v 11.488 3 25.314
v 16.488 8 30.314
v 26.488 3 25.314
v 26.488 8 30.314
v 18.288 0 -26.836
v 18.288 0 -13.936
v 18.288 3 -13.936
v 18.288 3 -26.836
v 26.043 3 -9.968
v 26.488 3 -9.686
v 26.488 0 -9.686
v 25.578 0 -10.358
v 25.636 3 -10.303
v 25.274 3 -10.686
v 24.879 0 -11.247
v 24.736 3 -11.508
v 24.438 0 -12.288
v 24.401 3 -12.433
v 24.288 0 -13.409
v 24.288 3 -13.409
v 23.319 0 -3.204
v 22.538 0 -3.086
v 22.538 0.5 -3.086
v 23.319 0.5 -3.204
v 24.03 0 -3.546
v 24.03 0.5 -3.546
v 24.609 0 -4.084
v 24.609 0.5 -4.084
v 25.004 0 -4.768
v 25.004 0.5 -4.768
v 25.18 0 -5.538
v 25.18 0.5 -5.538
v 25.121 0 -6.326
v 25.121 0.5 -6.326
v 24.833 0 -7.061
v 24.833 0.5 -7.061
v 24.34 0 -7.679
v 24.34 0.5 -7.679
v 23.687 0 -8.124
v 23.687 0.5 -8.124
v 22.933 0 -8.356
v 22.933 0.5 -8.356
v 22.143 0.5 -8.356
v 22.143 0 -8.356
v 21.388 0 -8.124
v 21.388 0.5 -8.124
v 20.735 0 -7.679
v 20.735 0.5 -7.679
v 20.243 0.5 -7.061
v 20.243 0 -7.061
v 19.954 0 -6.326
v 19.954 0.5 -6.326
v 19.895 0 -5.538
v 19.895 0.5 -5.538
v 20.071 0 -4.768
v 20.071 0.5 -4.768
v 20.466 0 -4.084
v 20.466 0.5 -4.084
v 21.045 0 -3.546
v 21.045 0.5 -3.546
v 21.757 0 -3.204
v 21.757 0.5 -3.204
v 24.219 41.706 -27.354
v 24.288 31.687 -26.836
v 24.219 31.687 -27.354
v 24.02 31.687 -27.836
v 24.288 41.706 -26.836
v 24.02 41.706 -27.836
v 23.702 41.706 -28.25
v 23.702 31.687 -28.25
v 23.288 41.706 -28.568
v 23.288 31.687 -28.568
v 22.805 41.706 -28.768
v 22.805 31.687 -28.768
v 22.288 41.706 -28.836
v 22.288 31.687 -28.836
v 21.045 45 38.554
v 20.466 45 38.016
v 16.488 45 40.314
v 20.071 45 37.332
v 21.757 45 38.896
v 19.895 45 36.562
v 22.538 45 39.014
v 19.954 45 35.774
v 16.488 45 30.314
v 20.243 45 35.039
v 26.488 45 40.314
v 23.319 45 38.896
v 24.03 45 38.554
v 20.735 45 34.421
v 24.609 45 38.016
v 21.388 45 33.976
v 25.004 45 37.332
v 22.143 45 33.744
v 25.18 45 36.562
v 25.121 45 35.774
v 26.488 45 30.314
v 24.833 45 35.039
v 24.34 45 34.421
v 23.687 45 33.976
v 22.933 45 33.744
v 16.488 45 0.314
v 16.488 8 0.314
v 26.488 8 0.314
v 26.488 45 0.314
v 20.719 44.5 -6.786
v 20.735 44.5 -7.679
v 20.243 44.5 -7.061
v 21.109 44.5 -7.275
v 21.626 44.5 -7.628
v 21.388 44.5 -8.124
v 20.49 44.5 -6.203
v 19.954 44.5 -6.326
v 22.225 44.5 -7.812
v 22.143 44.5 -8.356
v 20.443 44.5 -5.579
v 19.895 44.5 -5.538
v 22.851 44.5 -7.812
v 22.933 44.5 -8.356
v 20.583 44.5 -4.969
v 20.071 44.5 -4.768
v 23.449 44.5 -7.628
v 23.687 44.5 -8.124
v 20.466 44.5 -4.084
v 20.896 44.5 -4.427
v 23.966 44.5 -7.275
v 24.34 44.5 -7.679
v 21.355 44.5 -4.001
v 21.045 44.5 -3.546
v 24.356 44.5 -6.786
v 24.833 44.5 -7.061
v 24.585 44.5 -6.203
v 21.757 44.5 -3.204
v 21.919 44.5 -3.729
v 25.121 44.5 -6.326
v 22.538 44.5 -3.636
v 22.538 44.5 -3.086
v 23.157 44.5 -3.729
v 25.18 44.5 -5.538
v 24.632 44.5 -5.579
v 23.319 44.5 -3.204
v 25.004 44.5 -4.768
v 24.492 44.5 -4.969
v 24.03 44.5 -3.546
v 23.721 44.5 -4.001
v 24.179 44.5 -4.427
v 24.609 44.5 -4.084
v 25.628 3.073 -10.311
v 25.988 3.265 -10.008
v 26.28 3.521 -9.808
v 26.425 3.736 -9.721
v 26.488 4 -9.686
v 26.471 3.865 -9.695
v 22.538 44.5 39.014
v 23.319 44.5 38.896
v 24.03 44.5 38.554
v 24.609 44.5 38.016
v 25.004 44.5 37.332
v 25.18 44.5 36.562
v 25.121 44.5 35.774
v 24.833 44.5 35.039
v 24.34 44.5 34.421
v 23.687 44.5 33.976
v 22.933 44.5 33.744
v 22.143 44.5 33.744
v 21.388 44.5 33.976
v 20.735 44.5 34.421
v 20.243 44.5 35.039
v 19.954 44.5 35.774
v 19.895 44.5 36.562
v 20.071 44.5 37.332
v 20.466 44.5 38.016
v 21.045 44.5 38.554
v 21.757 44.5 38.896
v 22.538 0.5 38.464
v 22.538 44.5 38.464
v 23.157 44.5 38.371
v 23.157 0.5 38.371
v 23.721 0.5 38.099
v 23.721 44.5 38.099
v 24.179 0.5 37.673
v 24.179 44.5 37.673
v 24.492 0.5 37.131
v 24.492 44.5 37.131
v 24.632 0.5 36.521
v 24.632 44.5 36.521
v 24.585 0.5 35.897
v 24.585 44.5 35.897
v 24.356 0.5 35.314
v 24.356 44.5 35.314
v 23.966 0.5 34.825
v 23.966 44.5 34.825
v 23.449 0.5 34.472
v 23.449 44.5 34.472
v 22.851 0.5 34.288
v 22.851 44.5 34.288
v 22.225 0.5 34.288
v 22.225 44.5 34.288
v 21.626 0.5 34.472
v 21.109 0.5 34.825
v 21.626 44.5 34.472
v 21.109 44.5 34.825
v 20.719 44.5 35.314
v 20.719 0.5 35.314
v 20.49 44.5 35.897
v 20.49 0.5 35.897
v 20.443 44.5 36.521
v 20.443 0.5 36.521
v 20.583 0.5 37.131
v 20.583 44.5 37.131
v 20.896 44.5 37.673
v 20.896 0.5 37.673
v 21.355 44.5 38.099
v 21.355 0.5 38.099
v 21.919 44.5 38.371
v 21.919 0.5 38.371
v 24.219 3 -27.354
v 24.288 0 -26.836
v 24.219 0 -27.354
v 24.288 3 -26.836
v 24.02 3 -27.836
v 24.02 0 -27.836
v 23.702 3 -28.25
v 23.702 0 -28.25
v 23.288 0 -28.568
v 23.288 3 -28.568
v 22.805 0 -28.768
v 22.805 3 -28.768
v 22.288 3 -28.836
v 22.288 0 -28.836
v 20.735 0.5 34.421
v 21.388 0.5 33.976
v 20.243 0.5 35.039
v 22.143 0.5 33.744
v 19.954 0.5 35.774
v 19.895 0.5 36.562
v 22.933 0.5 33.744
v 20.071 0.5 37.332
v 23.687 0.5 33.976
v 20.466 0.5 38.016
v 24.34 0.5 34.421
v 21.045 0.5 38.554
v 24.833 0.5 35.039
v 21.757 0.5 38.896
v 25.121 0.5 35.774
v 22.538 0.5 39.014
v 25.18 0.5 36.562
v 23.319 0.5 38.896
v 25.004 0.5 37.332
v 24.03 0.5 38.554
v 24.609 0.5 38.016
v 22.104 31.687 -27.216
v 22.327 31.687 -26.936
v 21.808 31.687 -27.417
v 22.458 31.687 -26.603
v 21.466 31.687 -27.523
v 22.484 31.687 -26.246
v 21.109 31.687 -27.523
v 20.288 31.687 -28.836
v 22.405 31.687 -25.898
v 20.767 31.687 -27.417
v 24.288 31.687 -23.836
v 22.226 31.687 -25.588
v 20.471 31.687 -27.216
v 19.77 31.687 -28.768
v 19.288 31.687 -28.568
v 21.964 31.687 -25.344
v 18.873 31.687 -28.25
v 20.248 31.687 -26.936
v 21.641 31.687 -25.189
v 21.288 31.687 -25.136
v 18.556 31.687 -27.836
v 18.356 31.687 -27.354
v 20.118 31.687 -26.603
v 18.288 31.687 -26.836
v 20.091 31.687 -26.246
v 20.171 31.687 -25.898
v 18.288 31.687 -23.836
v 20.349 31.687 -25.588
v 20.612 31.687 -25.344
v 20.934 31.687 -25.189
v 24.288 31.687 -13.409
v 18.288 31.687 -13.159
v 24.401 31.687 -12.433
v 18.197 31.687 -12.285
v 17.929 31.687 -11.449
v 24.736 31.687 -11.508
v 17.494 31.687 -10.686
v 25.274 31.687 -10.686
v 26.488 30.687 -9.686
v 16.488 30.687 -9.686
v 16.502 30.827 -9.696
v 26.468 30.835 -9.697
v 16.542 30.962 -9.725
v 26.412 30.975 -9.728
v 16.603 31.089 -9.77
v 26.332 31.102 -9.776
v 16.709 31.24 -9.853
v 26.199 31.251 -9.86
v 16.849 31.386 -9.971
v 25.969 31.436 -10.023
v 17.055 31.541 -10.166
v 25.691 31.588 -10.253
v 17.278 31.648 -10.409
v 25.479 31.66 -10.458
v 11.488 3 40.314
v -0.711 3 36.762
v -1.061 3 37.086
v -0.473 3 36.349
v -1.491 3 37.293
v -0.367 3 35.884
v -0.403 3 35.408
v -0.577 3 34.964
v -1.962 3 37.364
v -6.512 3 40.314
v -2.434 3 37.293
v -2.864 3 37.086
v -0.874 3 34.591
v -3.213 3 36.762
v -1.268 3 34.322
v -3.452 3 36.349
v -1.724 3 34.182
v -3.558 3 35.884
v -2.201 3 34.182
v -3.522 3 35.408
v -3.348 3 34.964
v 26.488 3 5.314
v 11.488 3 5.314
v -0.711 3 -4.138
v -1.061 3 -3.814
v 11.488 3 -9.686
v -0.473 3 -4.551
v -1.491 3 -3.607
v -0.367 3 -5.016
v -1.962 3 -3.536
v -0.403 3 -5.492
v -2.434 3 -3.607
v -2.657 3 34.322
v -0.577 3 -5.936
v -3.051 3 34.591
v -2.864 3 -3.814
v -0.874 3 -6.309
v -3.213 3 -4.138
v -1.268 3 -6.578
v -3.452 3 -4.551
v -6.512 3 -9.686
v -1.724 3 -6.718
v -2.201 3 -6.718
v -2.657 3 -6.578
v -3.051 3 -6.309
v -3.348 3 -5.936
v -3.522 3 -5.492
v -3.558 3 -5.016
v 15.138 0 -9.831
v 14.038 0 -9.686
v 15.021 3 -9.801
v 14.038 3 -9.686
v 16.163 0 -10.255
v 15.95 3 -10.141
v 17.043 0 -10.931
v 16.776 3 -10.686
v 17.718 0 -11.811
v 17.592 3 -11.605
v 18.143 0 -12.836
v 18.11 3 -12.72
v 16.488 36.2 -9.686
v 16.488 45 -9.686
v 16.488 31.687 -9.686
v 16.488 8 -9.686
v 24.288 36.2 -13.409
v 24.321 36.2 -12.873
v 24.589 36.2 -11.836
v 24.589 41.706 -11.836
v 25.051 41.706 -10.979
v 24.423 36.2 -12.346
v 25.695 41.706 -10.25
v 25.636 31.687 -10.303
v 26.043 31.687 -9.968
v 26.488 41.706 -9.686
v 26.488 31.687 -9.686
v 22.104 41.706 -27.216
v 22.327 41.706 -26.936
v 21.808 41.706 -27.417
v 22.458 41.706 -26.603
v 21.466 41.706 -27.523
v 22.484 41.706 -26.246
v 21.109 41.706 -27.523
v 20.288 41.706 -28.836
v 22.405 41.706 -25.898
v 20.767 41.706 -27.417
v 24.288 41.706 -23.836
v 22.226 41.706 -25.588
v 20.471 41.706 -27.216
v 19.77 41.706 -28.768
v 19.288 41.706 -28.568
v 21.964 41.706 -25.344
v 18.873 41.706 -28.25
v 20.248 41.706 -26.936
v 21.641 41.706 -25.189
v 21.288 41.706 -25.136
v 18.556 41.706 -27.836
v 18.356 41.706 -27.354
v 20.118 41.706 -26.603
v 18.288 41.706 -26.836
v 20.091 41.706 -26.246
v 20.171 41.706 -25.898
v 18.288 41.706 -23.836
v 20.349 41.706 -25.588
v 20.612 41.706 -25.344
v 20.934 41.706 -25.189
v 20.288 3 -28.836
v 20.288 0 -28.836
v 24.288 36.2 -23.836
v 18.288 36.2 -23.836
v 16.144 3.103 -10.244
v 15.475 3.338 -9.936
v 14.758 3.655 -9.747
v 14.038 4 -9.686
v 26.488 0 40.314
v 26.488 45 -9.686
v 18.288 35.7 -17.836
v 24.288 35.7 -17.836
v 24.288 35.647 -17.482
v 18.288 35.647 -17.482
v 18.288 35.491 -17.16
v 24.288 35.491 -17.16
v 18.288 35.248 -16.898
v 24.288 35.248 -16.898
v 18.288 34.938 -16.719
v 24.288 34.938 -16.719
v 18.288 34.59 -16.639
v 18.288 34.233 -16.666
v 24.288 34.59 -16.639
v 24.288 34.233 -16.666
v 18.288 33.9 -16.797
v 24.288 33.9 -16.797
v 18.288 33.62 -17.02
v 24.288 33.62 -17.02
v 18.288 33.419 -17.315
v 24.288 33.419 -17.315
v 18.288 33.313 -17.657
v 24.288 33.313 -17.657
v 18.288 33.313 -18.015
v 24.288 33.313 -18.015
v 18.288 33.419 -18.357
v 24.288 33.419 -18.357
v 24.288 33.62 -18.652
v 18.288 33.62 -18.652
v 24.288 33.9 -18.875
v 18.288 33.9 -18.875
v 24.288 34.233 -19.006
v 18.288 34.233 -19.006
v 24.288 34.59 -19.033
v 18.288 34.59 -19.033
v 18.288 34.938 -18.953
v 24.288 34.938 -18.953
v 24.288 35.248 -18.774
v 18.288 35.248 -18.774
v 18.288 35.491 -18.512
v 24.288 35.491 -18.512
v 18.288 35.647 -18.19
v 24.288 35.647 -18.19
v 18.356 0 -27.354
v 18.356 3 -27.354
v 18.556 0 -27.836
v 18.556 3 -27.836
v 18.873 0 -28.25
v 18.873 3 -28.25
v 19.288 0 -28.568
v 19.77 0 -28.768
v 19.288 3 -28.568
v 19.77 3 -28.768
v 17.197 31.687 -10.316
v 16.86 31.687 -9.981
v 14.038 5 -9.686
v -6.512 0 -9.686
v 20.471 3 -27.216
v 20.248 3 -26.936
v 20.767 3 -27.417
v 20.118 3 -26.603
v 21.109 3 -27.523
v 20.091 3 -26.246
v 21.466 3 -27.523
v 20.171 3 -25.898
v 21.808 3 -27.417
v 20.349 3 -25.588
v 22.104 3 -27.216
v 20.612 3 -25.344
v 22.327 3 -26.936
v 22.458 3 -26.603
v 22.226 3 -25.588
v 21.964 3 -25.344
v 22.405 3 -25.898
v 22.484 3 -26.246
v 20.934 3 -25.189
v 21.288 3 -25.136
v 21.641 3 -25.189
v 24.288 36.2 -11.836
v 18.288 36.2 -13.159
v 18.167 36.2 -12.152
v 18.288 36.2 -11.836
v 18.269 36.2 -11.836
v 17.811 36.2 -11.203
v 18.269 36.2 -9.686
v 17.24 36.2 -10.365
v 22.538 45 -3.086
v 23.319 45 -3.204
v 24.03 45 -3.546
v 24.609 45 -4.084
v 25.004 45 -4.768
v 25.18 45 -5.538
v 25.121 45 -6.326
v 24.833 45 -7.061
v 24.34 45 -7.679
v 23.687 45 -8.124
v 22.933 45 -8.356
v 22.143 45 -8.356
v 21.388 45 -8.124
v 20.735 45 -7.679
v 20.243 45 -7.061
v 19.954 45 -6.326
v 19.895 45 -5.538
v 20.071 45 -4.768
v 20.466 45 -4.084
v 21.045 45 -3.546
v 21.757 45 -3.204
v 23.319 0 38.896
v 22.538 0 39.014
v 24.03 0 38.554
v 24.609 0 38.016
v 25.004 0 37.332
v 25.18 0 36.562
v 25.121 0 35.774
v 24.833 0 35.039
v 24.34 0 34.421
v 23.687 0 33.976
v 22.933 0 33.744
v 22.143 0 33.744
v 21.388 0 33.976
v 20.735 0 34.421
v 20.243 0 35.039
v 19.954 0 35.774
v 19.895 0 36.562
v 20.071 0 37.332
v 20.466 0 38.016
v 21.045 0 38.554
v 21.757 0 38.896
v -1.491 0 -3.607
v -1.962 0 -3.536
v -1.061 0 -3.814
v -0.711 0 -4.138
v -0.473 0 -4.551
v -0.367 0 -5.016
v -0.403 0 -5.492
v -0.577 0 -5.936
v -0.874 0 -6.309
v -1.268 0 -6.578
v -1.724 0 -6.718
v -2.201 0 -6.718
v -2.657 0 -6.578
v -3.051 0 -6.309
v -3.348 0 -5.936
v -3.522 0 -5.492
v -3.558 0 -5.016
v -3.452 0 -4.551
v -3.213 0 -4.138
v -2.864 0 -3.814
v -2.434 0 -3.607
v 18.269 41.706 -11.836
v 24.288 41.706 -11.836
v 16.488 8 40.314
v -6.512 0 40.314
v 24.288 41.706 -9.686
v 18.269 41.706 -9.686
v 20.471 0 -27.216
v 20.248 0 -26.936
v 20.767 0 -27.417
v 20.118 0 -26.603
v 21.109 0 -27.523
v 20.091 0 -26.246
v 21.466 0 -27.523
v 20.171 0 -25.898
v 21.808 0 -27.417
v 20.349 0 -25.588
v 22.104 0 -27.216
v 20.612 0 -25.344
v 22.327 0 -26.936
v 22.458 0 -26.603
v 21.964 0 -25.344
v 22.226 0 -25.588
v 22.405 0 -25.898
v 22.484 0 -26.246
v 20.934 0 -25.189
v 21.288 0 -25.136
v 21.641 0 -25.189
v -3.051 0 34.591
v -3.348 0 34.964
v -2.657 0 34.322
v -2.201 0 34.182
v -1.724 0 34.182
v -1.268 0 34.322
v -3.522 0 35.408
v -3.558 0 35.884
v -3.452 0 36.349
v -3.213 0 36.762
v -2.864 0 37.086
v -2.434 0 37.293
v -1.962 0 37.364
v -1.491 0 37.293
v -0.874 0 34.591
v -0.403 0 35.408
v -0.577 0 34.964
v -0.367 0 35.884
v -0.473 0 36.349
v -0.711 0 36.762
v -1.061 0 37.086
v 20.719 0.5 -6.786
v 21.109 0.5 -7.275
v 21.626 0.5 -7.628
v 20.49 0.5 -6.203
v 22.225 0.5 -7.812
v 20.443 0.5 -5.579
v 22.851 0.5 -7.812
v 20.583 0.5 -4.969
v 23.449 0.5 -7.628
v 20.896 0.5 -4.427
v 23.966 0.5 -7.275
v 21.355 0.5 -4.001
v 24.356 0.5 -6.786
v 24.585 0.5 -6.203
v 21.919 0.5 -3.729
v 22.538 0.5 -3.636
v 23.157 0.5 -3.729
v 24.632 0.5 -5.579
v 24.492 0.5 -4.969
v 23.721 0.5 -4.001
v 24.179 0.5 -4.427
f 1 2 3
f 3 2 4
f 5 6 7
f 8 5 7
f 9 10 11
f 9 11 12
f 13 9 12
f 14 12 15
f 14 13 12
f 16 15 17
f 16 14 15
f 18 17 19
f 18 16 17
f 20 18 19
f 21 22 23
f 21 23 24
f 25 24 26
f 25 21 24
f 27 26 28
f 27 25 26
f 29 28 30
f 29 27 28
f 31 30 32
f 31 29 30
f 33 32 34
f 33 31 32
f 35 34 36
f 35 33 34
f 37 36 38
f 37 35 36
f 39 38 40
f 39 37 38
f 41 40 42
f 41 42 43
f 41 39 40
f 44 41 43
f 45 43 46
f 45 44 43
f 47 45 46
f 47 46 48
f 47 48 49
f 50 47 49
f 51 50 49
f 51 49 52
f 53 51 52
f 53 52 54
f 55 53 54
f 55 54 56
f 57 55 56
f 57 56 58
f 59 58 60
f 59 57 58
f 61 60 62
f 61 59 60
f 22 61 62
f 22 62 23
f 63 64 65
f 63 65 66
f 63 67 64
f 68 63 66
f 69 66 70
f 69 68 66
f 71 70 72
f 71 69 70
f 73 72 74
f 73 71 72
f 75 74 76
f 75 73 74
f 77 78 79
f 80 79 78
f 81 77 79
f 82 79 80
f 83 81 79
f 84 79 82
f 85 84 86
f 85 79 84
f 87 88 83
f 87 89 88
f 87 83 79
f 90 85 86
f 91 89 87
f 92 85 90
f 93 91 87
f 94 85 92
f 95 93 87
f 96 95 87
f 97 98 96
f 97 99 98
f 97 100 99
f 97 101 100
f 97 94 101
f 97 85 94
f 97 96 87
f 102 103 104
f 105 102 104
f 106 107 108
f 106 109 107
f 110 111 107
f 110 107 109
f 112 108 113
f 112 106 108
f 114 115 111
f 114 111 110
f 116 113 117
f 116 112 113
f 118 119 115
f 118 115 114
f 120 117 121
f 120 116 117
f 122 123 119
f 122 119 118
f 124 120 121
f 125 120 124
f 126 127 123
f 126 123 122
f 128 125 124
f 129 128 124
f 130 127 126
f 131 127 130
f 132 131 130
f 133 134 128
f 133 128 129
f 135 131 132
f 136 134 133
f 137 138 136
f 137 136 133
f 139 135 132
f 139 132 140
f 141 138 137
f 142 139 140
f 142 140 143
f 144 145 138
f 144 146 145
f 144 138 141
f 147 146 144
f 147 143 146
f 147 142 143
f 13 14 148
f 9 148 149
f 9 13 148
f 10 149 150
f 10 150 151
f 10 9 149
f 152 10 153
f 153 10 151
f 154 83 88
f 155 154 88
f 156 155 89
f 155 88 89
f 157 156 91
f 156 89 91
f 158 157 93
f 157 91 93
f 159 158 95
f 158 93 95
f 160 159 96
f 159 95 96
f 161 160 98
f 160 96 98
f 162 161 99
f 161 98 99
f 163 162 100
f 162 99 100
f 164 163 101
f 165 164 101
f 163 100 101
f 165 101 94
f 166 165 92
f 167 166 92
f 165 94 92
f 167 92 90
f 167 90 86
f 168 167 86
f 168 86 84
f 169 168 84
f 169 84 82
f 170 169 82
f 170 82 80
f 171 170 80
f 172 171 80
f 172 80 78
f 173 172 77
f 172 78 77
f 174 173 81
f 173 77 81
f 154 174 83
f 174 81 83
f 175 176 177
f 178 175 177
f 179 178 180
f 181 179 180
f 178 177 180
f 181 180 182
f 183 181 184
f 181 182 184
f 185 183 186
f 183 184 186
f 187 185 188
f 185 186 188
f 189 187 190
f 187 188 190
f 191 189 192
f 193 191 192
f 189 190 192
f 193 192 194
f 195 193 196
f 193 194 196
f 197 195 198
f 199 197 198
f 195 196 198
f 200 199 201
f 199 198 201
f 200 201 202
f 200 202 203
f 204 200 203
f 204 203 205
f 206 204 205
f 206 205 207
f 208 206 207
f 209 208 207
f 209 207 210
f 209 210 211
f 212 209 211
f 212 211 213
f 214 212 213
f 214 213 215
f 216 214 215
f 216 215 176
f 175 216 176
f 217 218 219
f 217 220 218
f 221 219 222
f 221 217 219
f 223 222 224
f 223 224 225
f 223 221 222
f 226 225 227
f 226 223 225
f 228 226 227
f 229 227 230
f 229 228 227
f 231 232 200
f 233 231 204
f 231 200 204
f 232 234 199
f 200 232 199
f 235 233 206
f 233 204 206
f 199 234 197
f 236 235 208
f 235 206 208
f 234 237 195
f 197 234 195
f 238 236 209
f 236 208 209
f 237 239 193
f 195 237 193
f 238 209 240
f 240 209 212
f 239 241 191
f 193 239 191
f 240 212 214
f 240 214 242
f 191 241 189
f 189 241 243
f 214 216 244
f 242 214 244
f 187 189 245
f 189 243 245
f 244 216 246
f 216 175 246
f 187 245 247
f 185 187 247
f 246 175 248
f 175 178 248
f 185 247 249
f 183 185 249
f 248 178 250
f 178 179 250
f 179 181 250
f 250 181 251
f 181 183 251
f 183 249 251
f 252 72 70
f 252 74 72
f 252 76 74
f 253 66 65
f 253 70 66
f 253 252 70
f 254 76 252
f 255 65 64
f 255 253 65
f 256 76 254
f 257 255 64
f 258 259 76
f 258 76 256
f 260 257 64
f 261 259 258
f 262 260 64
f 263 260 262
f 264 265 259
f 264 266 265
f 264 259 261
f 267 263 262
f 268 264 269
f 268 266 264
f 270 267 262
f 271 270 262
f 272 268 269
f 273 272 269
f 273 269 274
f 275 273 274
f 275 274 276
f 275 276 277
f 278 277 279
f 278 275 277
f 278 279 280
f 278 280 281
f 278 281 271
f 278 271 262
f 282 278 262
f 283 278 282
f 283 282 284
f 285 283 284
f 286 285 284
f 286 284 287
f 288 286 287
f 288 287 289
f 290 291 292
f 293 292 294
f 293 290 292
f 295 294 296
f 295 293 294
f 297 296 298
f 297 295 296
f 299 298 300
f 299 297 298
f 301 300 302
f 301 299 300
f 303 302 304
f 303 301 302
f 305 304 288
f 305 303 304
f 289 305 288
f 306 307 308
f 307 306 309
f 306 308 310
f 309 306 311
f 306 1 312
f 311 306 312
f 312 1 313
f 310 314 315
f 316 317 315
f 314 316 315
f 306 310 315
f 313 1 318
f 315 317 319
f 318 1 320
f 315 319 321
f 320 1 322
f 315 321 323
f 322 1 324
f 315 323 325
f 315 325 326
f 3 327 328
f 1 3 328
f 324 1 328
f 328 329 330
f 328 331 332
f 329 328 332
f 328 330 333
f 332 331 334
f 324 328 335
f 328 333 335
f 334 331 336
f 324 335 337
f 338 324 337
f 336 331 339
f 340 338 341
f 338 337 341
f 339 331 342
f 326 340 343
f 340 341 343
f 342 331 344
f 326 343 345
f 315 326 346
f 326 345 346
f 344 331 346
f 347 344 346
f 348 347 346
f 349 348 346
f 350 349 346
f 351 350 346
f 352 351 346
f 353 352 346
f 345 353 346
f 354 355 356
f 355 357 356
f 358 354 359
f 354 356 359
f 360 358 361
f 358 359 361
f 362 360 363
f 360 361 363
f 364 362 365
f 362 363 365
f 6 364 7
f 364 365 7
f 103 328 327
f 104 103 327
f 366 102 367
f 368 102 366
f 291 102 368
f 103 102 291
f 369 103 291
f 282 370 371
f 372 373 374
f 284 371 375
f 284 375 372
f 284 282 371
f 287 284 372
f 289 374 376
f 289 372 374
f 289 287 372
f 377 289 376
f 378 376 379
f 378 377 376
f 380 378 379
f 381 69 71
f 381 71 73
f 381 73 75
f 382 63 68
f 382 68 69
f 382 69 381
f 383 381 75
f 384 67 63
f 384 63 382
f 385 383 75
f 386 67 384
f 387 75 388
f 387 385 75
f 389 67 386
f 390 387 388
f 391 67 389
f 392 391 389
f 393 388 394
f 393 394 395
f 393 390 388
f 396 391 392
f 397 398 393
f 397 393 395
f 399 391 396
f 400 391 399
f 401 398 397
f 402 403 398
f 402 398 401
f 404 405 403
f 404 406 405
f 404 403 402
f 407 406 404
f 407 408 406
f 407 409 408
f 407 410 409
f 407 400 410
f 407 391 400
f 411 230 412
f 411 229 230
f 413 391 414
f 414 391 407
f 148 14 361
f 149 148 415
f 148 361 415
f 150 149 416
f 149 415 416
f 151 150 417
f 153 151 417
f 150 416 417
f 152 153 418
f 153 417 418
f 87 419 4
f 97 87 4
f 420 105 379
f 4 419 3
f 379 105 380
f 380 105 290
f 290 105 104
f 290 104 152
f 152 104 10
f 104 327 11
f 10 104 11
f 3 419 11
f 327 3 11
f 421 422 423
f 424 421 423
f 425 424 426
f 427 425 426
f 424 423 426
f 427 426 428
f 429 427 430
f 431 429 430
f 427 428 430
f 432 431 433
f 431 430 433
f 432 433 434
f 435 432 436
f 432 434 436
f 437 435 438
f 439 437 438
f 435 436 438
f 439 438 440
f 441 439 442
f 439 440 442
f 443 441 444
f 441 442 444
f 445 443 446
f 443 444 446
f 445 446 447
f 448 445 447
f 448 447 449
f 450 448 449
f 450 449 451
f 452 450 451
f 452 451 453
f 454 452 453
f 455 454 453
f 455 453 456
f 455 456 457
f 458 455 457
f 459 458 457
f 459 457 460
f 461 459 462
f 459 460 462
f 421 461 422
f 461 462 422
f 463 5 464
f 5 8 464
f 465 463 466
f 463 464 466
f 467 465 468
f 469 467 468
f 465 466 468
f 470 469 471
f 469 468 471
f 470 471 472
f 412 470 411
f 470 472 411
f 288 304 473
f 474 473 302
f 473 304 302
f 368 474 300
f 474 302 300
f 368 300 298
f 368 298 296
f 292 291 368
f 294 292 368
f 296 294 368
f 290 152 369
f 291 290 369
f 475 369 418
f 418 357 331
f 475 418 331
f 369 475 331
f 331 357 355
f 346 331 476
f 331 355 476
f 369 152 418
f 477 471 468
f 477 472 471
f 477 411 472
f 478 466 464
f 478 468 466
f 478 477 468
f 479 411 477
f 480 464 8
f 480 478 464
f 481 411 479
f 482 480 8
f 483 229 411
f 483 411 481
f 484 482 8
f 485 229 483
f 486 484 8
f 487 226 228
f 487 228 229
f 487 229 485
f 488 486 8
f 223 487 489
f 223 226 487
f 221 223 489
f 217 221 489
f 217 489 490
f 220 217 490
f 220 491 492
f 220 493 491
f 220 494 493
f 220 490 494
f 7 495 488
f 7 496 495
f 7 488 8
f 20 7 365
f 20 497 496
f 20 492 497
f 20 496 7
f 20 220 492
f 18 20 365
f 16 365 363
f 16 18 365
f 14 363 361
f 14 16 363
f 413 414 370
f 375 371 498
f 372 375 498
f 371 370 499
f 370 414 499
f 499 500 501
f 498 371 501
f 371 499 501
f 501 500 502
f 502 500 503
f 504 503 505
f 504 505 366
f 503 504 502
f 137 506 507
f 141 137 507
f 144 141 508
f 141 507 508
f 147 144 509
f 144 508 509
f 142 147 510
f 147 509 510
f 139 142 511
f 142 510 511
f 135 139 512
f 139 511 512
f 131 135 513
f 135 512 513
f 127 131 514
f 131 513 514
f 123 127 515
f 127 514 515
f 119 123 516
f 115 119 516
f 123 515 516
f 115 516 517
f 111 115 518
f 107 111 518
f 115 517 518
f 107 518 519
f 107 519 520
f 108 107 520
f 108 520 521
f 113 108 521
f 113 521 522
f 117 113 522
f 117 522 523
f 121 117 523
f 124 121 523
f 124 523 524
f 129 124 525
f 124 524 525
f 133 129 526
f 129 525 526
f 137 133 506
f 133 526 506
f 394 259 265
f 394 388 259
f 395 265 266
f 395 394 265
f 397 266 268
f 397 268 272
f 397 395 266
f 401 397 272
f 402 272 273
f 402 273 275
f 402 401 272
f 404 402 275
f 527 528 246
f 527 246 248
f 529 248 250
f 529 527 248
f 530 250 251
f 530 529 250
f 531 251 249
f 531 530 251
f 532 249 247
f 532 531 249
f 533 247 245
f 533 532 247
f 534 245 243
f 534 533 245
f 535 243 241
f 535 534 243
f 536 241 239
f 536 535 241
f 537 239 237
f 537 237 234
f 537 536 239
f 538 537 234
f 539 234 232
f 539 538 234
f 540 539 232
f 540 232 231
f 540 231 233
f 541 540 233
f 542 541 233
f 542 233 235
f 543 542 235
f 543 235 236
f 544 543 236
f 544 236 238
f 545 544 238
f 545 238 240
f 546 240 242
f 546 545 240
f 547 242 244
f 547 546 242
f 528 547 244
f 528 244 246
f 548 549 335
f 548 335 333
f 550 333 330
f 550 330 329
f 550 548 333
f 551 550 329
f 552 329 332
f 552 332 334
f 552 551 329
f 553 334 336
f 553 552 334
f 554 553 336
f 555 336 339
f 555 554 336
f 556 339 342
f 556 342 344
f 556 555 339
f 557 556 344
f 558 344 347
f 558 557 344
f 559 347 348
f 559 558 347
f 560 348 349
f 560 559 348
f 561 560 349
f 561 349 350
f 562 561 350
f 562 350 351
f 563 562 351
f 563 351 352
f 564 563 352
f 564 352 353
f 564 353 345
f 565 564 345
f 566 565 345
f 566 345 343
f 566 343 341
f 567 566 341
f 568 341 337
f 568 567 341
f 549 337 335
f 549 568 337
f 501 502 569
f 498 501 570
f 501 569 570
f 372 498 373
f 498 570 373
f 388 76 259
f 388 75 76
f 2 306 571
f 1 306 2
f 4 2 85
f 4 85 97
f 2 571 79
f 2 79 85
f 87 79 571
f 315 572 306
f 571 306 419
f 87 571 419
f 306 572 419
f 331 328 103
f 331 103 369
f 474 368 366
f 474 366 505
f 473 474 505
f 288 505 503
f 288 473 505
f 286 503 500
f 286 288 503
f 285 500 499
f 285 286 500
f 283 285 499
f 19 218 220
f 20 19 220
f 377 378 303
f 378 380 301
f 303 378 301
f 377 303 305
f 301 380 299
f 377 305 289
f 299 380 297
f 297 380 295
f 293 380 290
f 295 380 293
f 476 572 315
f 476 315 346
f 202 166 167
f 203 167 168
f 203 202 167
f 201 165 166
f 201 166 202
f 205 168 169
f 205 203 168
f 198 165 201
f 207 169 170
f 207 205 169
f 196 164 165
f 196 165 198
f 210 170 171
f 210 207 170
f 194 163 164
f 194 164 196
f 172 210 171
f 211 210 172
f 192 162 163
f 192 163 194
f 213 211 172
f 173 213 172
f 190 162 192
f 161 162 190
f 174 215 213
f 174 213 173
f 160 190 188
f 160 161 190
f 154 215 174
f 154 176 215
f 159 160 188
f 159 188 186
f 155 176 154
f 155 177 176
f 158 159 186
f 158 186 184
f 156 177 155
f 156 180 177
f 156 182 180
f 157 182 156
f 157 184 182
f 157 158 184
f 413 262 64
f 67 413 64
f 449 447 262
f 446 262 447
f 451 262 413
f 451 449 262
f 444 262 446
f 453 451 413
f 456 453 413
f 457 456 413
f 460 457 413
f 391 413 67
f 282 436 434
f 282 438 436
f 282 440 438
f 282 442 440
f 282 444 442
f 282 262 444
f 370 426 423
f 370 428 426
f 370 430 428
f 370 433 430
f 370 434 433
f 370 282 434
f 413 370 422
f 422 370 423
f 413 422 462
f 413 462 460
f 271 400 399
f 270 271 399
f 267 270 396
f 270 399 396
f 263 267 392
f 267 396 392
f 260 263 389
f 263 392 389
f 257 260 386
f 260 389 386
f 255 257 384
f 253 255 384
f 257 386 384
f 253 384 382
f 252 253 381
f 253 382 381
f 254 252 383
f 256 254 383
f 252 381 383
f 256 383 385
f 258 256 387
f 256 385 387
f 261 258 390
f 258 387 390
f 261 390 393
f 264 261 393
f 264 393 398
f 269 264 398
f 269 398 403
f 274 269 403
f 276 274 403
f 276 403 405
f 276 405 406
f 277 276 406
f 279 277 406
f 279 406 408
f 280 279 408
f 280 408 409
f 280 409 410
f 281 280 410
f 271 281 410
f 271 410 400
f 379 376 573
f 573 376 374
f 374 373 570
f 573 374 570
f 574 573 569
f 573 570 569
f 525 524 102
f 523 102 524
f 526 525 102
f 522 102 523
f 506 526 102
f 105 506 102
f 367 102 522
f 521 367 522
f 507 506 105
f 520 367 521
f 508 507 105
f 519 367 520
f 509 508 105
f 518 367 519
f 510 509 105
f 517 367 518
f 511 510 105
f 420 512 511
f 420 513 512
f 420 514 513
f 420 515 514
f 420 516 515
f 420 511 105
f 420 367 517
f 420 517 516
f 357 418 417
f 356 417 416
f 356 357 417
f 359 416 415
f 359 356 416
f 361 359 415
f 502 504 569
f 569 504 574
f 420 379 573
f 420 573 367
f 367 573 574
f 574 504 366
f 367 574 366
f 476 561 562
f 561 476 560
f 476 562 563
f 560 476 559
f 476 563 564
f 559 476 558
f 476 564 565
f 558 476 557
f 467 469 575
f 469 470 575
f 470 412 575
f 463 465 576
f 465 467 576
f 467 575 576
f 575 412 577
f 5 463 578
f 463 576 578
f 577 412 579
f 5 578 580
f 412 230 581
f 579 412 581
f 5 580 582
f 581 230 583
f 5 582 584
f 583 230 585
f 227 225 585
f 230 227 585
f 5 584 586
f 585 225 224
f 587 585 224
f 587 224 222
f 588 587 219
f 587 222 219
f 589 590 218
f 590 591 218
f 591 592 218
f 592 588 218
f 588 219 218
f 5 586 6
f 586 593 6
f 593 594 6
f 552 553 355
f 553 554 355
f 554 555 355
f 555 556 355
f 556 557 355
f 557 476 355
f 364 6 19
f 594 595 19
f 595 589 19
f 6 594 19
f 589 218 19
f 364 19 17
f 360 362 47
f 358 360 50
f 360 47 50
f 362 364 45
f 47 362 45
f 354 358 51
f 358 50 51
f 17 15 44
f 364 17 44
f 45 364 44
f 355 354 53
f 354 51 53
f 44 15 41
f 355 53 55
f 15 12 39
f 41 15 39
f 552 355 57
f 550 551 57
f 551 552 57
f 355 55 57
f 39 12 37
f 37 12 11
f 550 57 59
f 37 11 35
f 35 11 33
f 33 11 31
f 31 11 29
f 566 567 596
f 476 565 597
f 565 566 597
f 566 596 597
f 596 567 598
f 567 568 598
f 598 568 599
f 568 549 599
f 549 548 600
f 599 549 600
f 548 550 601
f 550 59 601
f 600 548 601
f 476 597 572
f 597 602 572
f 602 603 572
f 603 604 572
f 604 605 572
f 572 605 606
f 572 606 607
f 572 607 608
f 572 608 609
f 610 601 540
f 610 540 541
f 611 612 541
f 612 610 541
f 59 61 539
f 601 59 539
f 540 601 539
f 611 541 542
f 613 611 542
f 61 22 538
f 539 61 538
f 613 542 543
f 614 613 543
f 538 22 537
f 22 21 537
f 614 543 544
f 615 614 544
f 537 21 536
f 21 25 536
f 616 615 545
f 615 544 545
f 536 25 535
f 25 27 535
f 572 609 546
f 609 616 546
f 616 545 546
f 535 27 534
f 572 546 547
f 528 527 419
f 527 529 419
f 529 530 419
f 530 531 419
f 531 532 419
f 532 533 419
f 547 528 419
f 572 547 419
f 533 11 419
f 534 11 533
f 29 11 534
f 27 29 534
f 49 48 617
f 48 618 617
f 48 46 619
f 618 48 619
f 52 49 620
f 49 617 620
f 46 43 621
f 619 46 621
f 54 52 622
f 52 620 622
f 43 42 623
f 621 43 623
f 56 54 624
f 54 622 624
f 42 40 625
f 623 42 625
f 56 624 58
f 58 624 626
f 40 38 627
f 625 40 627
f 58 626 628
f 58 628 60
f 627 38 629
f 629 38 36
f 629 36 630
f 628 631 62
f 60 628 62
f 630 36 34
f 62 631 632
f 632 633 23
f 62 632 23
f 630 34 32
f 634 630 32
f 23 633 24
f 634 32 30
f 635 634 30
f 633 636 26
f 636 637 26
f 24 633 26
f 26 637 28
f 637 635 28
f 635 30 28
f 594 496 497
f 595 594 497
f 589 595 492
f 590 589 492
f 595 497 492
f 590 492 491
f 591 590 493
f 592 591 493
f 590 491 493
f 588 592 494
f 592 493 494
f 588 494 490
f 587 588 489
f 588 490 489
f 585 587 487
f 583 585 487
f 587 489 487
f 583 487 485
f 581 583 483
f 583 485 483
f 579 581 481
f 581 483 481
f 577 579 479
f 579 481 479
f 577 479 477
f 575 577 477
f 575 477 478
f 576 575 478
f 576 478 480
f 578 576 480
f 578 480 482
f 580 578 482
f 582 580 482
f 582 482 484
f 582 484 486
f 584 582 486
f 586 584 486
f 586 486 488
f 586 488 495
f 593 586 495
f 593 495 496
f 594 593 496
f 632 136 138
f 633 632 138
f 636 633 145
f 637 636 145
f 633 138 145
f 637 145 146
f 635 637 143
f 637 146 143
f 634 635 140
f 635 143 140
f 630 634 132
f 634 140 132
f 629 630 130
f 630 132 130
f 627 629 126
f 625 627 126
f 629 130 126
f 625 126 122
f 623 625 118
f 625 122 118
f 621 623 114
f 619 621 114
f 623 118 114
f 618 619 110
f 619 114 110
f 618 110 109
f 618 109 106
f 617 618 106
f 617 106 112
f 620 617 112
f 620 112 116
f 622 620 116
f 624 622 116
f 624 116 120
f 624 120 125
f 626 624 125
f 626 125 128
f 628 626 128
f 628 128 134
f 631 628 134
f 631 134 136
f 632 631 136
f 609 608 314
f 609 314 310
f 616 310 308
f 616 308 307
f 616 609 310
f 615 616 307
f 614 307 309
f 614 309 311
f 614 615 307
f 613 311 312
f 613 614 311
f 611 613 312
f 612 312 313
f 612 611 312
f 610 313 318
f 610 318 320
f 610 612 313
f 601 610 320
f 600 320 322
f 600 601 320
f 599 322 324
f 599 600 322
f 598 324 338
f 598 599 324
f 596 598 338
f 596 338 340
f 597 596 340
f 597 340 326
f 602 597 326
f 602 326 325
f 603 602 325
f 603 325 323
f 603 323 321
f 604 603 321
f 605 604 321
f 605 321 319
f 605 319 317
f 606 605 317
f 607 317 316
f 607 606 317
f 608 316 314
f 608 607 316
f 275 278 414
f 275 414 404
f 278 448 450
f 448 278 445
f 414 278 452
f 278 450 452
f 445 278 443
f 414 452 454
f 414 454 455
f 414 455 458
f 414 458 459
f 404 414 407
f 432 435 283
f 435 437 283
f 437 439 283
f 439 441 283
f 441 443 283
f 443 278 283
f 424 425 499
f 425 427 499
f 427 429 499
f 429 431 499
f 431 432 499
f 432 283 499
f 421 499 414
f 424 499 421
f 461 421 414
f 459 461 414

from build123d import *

# Parameters (mm, degrees)
SKETCH1_R           = 1.6
BOSS_EXTRUDE1_DEPTH = 3
SKETCH2_W           = 10
SKETCH2_H           = 10
BOSS_EXTRUDE2_DEPTH = 42
CHAMFER1_SIZE       = 5
SKETCH3_R           = 2.1
CUT_EXTRUDE1_DEPTH  = 52
SKETCH4_R           = 2.65
CUT_EXTRUDE2_DEPTH  = 0.5
SKETCH5_W           = 6
SKETCH5_H           = 4.513236852
BOSS_EXTRUDE3_DEPTH = 14.15
SKETCH6_R           = 1.2
CUT_EXTRUDE3_DEPTH  = 6
SKETCH7_W           = 6
SKETCH7_H           = 10.018921585
BOSS_EXTRUDE4_DEPTH = 5
SKETCH8_W           = 6.018924213
SKETCH8_H           = 5.505684733
BOSS_EXTRUDE5_DEPTH = 2.15
SKETCH9_W           = 6
SKETCH9_H           = 3
BOSS_EXTRUDE6_DEPTH = 19.15
SKETCH10_R          = 1.2
CUT_EXTRUDE4_DEPTH  = 64.766604599
FILLET3_R           = 2
FILLET4_R           = 4.25
FILLET5_R           = 4.25
FILLET6_R           = 4.25
FILLET7_R           = 4.25
FILLET8_START       = 17.362615229
FILLET8_DEPTH       = 7.820980384
FILLET8_START_2     = 14.037603206
FILLET8_2_DEPTH     = 12.4500001
FILLET8_START_3     = 3
FILLET8_3_DEPTH     = 2
FILLET9_R           = 1


with BuildPart() as part:
    # Sketch1 → Boss-Extrude1 (new body)
    with BuildSketch(Plane(origin=(0, 0, 0), x_dir=(1, 0, 0), z_dir=(0, 1, 0))):
        Polygon((-6.512396694, 9.685950413), (1.487603306, 9.685950413), (26.487603306, 9.685950413), (26.487603306, -40.314049587), (1.487603306, -40.314049587), (-6.512396694, -40.314049587), align=None)
        with Locations(Location((-1.962396694, -35.764049587, 0), (0, 0, 270))):
            Circle(SKETCH1_R, mode=Mode.SUBTRACT)
        with Locations(Location((-1.962396694, 5.135950413, 0), (0, 0, 270))):
            Circle(SKETCH1_R, mode=Mode.SUBTRACT)
    extrude(amount=BOSS_EXTRUDE1_DEPTH)

    # Sketch2 → Boss-Extrude2 (add)
    with BuildSketch(Plane(origin=(0, 3, 0), x_dir=(1, 0, 0), z_dir=(0, 1, 0))):
        with Locations((21.487603306, -35.314049587)):
            Rectangle(SKETCH2_W, SKETCH2_H)
        with Locations((21.487603306, 4.685950413)):
            Rectangle(SKETCH2_W, SKETCH2_H)
    extrude(amount=BOSS_EXTRUDE2_DEPTH)

    # Chamfer1
    chamfer1_edges = [part.edges().sort_by_distance(p)[0] for p in [
        (21.487603306, 3, 30.314049587),
        (16.487603306, 3, 35.314049587),
        (16.487603306, 3, -4.685950413),
        (21.487603306, 3, 0.314049587),
    ]]
    chamfer(chamfer1_edges, length=CHAMFER1_SIZE)

    # Sketch3 → Cut-Extrude1 (cut)
    with BuildSketch(Plane(origin=(0, 45, 0), x_dir=(1, 0, 0), z_dir=(0, 1, 0))):
        with Locations(Location((22.537603306, -36.364049587, 0), (0, 0, 270))):
            Circle(SKETCH3_R)
        with Locations(Location((22.537603306, 5.735950413, 0), (0, 0, 270))):
            Circle(SKETCH3_R)
    extrude(amount=-CUT_EXTRUDE1_DEPTH, mode=Mode.SUBTRACT)

    # Sketch4 → Cut-Extrude2 (cut)
    with BuildSketch(Plane(origin=(0, 45, 0), x_dir=(1, 0, 0), z_dir=(0, 1, 0))):
        with Locations(Location((22.537603306, -36.364049587, 0), (0, 0, 270))):
            Circle(SKETCH4_R)
        with Locations(Location((22.537603306, 5.735950413, 0), (0, 0, 270))):
            Circle(SKETCH4_R)
    cut_extrude2 = extrude(amount=-CUT_EXTRUDE2_DEPTH, mode=Mode.SUBTRACT)

    # Mirror1: Cut-Extrude2 across plane
    add(cut_extrude2.mirror(Plane(origin=(0, 22.5, 0), x_dir=(0, 0, 1), z_dir=(0, -1, 0))), mode=Mode.SUBTRACT)

    # Sketch5 → Boss-Extrude3 (add)
    with BuildSketch(Plane(origin=(0, 0, -9.685950413), x_dir=(-1, 0, 0), z_dir=(0, 0, -1))):
        with Locations((-21.287603306, 33.943381574)):
            Rectangle(SKETCH5_W, SKETCH5_H)
    extrude(amount=BOSS_EXTRUDE3_DEPTH)

    # Sketch6 → Cut-Extrude3 (cut)
    with BuildSketch(Plane(origin=(24.287603306, 0, 0), x_dir=(0, 0, -1), z_dir=(1, 0, 0))):
        with Locations(Location((17.835950413, 34.5, 0), (0, 0, 90))):
            Circle(SKETCH6_R)
    extrude(amount=-CUT_EXTRUDE3_DEPTH, mode=Mode.SUBTRACT)

    # Sketch7 → Boss-Extrude4 (add)
    with BuildSketch(Plane(origin=(0, 0, -23.835950413), x_dir=(-1, 0, 0), z_dir=(0, 0, -1))):
        with Locations((-21.287603306, 36.696223941)):
            Rectangle(SKETCH7_W, SKETCH7_H)
    extrude(amount=BOSS_EXTRUDE4_DEPTH)

    # Sketch8 → Boss-Extrude5 (add)
    with BuildSketch(Plane(origin=(0, 0, -9.685950413), x_dir=(-1, 0, 0), z_dir=(0, 0, -1))):
        with Locations((-21.278141199, 38.952842367)):
            Rectangle(SKETCH8_W, SKETCH8_H)
    extrude(amount=BOSS_EXTRUDE5_DEPTH)

    # Sketch9 → Boss-Extrude6 (add)
    with BuildSketch(Plane(origin=(0, 0, -9.685950413), x_dir=(-1, 0, 0), z_dir=(0, 0, -1))):
        with Locations((-21.287603306, 1.5)):
            Rectangle(SKETCH9_W, SKETCH9_H)
    extrude(amount=BOSS_EXTRUDE6_DEPTH)

    # Sketch10 → Cut-Extrude4 (cut, through all)
    with BuildSketch(Plane(origin=(0, 41.705684733, 0), x_dir=(1, 0, 0), z_dir=(0, 1, 0))):
        with Locations(Location((21.287603306, 26.335950413, 0), (0, 0, 270))):
            Circle(SKETCH10_R)
    extrude(amount=-CUT_EXTRUDE4_DEPTH, mode=Mode.SUBTRACT)

    # Fillet3
    fillet3_edges = [part.edges().sort_by_distance(p)[0] for p in [
        (24.287603306, 36.696223941, -28.835950413),
        (18.287603306, 36.696223941, -28.835950413),
        (18.287603306, 1.5, -28.835950413),
        (24.287603306, 1.5, -28.835950413),
    ]]
    fillet(fillet3_edges, radius=FILLET3_R)

    # Fillet4
    # the kernel refuses this fillet: 4.25 mm, written as the material it adds along each edge
    with BuildSketch(Plane(origin=(24.287603306, 3, -9.685950413), x_dir=(0, 0, -1), z_dir=(0, -1, 0))) as fillet4_piece_1:
        with BuildLine():
            CenterArc((3.722902094, 4.25), FILLET4_R, 208.839189401, 61.160810599)
            Line((0, 2.2), (-0.074458042, 2.159))
            ThreePointArc((-0.074458042, 2.159), (-0.085, 1.1), (-0.085, 0))
            Line((-0.085, 0), (0, -0.085))
            Line((0, -0.085), (3.722902094, -0.085))
            Line((3.722902094, -0.085), (3.722902094, 0))
        make_face()
    extrude(amount=3)

    # Fillet5
    fillet5_edges = [part.edges().sort_by_distance(p)[0] for p in [
        (18.287603306, 1.5, -9.685950413),
    ]]
    fillet(fillet5_edges, radius=FILLET5_R)

    # Fillet6
    # the kernel refuses this fillet: 4.25 mm, written as the material it adds along each edge
    with BuildSketch(Plane(origin=(24.287603306, 31.686763148, -9.685950413), x_dir=(1, 0, 0), z_dir=(0, 1, 0))) as fillet6_piece_1_section:
        with BuildLine():
            CenterArc((4.25, 3.722902094), FILLET6_R, 180, 61.160810599)
            Line((0, 3.722902094), (-0.085, 3.722902094))
            Line((-0.085, 3.722902094), (-0.085, 0))
            Line((-0.085, 0), (0, -0.085))
            ThreePointArc((0, -0.085), (1.1, -0.085), (2.159, -0.074458042))
            Line((2.159, -0.074458042), (2.2, 0))
        make_face()
    fillet6_piece_1 = extrude(amount=10.018921585, mode=Mode.PRIVATE)
    fillet6_piece_1 = split(fillet6_piece_1, bisect_by=Plane(origin=(24.287603306, 31.686763148, -11.835950413), z_dir=(0, 0, 1)), keep=Keep.TOP, mode=Mode.PRIVATE)
    fillet6_piece_1 = split(fillet6_piece_1, bisect_by=Plane(origin=(24.287603306, 36.2, -9.685950413), z_dir=(0, -1, 0)), keep=Keep.TOP, mode=Mode.PRIVATE)
    add(fillet6_piece_1)
    with BuildSketch(Plane(origin=(24.287603306, 31.686763148, -9.685950413), x_dir=(1, 0, 0), z_dir=(0, 1, 0))) as fillet6_piece_2_section:
        with BuildLine():
            CenterArc((4.25, 3.722902094), FILLET6_R, 180, 61.160810599)
            Line((0, 3.722902094), (-0.085, 3.722902094))
            Line((-0.085, 3.722902094), (-0.085, 0))
            Line((-0.085, 0), (0, -0.085))
            ThreePointArc((0, -0.085), (1.1, -0.085), (2.159, -0.074458042))
            Line((2.159, -0.074458042), (2.2, 0))
        make_face()
    fillet6_piece_2 = extrude(amount=10.018921585, mode=Mode.PRIVATE)
    fillet6_piece_2 = split(fillet6_piece_2, bisect_by=Plane(origin=(24.287603306, 31.686763148, -11.835950413), z_dir=(0, 0, -1)), keep=Keep.TOP, mode=Mode.PRIVATE)
    fillet6_piece_2 = split(fillet6_piece_2, bisect_by=Plane(origin=(24.287603306, 36.2, -9.685950413), z_dir=(0, -1, 0)), keep=Keep.TOP, mode=Mode.PRIVATE)
    add(fillet6_piece_2)
    with BuildSketch(Plane(origin=(24.287603306, 31.686763148, -9.685950413), x_dir=(1, 0, 0), z_dir=(0, 1, 0))) as fillet6_piece_3_section:
        with BuildLine():
            CenterArc((4.25, 3.722902094), FILLET6_R, 180, 61.160810599)
            Line((0, 3.722902094), (-0.085, 3.722902094))
            Line((-0.085, 3.722902094), (-0.085, 0))
            Line((-0.085, 0), (0, -0.085))
            ThreePointArc((0, -0.085), (1.1, -0.085), (2.159, -0.074458042))
            Line((2.159, -0.074458042), (2.2, 0))
        make_face()
    fillet6_piece_3 = extrude(amount=10.018921585, mode=Mode.PRIVATE)
    fillet6_piece_3 = split(fillet6_piece_3, bisect_by=Plane(origin=(24.287603306, 31.686763148, -11.835950413), z_dir=(0, 0, 1)), keep=Keep.TOP, mode=Mode.PRIVATE)
    fillet6_piece_3 = split(fillet6_piece_3, bisect_by=Plane(origin=(24.287603306, 36.2, -9.685950413), z_dir=(0, 1, 0)), keep=Keep.TOP, mode=Mode.PRIVATE)
    add(fillet6_piece_3)

    # Fillet7
    # the kernel refuses this fillet: 4.25 mm, written as the material it adds along each edge
    with BuildSketch(Plane(origin=(18.287603306, 31.686763148, -9.685950413), x_dir=(0, 0, -1), z_dir=(0, 1, 0))) as fillet7_piece_1:
        with BuildLine():
            CenterArc((3.472751071, 4.25), FILLET7_R, 215.202683568, 54.797316432)
            Line((0, 1.8), (0, 0))
            Line((0, 0), (3.472751071, 0))
        make_face()
    extrude(amount=4.513236852)

    # Fillet8: read off the stored shape, not the designer's step
    # Fillet8 outline → Fillet8 (add)
    with BuildSketch(Plane.YZ.offset(FILLET8_START)):
        with BuildLine():
            ThreePointArc((3, -10.685950413), (3.292893219, -9.978843632), (4, -9.685950413))
            Line((4, -9.685950413), (3, -9.685950413))
            Line((3, -9.685950413), (3, -10.685950413))
        make_face()
    extrude(amount=FILLET8_DEPTH)

    # Fillet8 2 outline → Fillet8 2 (add)
    with BuildSketch(Plane.YZ.offset(FILLET8_START_2)):
        with BuildLine():
            ThreePointArc((3, -10.685950413), (3.292893219, -9.978843632), (4, -9.685950413))
            Line((4, -9.685950413), (3, -9.685950413))
            Line((3, -9.685950413), (3, -10.685950413))
        make_face()
    extrude(amount=FILLET8_2_DEPTH)

    # Fillet8 3 outline → Fillet8 3 (cut)
    with BuildSketch(Plane(origin=(0, 0, 0), x_dir=(1, 0, 0), z_dir=(0, 1, 0)).offset(FILLET8_START_3)):
        with BuildLine():
            ThreePointArc((25.274429362, 10.685950413), (25.834372953, 10.129363879), (26.487603306, 9.685950413))
            Line((26.487603306, 9.685950413), (26.487603306, 10.685950413))
            Line((26.487603306, 10.685950413), (25.274429362, 10.685950413))
        make_face()
        with BuildLine():
            Line((14.037603206, 10.685950413), (14.037603306, 9.685950413))
            ThreePointArc((14.037603306, 9.685950413), (15.495341279, 9.943770557), (16.776216093, 10.685950413))
            Line((16.776216093, 10.685950413), (14.037603206, 10.685950413))
        make_face()
    extrude(amount=FILLET8_3_DEPTH, mode=Mode.SUBTRACT)

    # Fillet9
    # the kernel refuses this fillet: 1 mm, written as the material it adds along each edge
    with BuildSketch(Plane(origin=(26.487603306, 31.686763148, -9.685950413), x_dir=(0, -1, 0), z_dir=(-1, 0, 0))) as fillet9_piece_1_section:
        with BuildLine():
            CenterArc((FILLET9_R, -FILLET9_R), FILLET9_R, 90, 90)
            Line((0, -FILLET9_R), (0, 0))
            Line((0, 0), (FILLET9_R, 0))
        make_face()
    fillet9_piece_1 = extrude(amount=10, mode=Mode.PRIVATE)
    fillet9_piece_1 = fillet9_piece_1 - Plane(origin=(14.037603306, 31.686763148, -13.158701484), x_dir=(0, 0, -1), z_dir=(0, -1, 0)) * Cylinder(4.25, 25, mode=Mode.PRIVATE)
    fillet9_piece_1 = fillet9_piece_1 - Plane(origin=(28.537603306, 31.686763148, -13.408852507), x_dir=(1, 0, 0), z_dir=(0, -1, 0)) * Cylinder(4.25, 25, mode=Mode.PRIVATE)
    add(fillet9_piece_1)


solid = part.part
